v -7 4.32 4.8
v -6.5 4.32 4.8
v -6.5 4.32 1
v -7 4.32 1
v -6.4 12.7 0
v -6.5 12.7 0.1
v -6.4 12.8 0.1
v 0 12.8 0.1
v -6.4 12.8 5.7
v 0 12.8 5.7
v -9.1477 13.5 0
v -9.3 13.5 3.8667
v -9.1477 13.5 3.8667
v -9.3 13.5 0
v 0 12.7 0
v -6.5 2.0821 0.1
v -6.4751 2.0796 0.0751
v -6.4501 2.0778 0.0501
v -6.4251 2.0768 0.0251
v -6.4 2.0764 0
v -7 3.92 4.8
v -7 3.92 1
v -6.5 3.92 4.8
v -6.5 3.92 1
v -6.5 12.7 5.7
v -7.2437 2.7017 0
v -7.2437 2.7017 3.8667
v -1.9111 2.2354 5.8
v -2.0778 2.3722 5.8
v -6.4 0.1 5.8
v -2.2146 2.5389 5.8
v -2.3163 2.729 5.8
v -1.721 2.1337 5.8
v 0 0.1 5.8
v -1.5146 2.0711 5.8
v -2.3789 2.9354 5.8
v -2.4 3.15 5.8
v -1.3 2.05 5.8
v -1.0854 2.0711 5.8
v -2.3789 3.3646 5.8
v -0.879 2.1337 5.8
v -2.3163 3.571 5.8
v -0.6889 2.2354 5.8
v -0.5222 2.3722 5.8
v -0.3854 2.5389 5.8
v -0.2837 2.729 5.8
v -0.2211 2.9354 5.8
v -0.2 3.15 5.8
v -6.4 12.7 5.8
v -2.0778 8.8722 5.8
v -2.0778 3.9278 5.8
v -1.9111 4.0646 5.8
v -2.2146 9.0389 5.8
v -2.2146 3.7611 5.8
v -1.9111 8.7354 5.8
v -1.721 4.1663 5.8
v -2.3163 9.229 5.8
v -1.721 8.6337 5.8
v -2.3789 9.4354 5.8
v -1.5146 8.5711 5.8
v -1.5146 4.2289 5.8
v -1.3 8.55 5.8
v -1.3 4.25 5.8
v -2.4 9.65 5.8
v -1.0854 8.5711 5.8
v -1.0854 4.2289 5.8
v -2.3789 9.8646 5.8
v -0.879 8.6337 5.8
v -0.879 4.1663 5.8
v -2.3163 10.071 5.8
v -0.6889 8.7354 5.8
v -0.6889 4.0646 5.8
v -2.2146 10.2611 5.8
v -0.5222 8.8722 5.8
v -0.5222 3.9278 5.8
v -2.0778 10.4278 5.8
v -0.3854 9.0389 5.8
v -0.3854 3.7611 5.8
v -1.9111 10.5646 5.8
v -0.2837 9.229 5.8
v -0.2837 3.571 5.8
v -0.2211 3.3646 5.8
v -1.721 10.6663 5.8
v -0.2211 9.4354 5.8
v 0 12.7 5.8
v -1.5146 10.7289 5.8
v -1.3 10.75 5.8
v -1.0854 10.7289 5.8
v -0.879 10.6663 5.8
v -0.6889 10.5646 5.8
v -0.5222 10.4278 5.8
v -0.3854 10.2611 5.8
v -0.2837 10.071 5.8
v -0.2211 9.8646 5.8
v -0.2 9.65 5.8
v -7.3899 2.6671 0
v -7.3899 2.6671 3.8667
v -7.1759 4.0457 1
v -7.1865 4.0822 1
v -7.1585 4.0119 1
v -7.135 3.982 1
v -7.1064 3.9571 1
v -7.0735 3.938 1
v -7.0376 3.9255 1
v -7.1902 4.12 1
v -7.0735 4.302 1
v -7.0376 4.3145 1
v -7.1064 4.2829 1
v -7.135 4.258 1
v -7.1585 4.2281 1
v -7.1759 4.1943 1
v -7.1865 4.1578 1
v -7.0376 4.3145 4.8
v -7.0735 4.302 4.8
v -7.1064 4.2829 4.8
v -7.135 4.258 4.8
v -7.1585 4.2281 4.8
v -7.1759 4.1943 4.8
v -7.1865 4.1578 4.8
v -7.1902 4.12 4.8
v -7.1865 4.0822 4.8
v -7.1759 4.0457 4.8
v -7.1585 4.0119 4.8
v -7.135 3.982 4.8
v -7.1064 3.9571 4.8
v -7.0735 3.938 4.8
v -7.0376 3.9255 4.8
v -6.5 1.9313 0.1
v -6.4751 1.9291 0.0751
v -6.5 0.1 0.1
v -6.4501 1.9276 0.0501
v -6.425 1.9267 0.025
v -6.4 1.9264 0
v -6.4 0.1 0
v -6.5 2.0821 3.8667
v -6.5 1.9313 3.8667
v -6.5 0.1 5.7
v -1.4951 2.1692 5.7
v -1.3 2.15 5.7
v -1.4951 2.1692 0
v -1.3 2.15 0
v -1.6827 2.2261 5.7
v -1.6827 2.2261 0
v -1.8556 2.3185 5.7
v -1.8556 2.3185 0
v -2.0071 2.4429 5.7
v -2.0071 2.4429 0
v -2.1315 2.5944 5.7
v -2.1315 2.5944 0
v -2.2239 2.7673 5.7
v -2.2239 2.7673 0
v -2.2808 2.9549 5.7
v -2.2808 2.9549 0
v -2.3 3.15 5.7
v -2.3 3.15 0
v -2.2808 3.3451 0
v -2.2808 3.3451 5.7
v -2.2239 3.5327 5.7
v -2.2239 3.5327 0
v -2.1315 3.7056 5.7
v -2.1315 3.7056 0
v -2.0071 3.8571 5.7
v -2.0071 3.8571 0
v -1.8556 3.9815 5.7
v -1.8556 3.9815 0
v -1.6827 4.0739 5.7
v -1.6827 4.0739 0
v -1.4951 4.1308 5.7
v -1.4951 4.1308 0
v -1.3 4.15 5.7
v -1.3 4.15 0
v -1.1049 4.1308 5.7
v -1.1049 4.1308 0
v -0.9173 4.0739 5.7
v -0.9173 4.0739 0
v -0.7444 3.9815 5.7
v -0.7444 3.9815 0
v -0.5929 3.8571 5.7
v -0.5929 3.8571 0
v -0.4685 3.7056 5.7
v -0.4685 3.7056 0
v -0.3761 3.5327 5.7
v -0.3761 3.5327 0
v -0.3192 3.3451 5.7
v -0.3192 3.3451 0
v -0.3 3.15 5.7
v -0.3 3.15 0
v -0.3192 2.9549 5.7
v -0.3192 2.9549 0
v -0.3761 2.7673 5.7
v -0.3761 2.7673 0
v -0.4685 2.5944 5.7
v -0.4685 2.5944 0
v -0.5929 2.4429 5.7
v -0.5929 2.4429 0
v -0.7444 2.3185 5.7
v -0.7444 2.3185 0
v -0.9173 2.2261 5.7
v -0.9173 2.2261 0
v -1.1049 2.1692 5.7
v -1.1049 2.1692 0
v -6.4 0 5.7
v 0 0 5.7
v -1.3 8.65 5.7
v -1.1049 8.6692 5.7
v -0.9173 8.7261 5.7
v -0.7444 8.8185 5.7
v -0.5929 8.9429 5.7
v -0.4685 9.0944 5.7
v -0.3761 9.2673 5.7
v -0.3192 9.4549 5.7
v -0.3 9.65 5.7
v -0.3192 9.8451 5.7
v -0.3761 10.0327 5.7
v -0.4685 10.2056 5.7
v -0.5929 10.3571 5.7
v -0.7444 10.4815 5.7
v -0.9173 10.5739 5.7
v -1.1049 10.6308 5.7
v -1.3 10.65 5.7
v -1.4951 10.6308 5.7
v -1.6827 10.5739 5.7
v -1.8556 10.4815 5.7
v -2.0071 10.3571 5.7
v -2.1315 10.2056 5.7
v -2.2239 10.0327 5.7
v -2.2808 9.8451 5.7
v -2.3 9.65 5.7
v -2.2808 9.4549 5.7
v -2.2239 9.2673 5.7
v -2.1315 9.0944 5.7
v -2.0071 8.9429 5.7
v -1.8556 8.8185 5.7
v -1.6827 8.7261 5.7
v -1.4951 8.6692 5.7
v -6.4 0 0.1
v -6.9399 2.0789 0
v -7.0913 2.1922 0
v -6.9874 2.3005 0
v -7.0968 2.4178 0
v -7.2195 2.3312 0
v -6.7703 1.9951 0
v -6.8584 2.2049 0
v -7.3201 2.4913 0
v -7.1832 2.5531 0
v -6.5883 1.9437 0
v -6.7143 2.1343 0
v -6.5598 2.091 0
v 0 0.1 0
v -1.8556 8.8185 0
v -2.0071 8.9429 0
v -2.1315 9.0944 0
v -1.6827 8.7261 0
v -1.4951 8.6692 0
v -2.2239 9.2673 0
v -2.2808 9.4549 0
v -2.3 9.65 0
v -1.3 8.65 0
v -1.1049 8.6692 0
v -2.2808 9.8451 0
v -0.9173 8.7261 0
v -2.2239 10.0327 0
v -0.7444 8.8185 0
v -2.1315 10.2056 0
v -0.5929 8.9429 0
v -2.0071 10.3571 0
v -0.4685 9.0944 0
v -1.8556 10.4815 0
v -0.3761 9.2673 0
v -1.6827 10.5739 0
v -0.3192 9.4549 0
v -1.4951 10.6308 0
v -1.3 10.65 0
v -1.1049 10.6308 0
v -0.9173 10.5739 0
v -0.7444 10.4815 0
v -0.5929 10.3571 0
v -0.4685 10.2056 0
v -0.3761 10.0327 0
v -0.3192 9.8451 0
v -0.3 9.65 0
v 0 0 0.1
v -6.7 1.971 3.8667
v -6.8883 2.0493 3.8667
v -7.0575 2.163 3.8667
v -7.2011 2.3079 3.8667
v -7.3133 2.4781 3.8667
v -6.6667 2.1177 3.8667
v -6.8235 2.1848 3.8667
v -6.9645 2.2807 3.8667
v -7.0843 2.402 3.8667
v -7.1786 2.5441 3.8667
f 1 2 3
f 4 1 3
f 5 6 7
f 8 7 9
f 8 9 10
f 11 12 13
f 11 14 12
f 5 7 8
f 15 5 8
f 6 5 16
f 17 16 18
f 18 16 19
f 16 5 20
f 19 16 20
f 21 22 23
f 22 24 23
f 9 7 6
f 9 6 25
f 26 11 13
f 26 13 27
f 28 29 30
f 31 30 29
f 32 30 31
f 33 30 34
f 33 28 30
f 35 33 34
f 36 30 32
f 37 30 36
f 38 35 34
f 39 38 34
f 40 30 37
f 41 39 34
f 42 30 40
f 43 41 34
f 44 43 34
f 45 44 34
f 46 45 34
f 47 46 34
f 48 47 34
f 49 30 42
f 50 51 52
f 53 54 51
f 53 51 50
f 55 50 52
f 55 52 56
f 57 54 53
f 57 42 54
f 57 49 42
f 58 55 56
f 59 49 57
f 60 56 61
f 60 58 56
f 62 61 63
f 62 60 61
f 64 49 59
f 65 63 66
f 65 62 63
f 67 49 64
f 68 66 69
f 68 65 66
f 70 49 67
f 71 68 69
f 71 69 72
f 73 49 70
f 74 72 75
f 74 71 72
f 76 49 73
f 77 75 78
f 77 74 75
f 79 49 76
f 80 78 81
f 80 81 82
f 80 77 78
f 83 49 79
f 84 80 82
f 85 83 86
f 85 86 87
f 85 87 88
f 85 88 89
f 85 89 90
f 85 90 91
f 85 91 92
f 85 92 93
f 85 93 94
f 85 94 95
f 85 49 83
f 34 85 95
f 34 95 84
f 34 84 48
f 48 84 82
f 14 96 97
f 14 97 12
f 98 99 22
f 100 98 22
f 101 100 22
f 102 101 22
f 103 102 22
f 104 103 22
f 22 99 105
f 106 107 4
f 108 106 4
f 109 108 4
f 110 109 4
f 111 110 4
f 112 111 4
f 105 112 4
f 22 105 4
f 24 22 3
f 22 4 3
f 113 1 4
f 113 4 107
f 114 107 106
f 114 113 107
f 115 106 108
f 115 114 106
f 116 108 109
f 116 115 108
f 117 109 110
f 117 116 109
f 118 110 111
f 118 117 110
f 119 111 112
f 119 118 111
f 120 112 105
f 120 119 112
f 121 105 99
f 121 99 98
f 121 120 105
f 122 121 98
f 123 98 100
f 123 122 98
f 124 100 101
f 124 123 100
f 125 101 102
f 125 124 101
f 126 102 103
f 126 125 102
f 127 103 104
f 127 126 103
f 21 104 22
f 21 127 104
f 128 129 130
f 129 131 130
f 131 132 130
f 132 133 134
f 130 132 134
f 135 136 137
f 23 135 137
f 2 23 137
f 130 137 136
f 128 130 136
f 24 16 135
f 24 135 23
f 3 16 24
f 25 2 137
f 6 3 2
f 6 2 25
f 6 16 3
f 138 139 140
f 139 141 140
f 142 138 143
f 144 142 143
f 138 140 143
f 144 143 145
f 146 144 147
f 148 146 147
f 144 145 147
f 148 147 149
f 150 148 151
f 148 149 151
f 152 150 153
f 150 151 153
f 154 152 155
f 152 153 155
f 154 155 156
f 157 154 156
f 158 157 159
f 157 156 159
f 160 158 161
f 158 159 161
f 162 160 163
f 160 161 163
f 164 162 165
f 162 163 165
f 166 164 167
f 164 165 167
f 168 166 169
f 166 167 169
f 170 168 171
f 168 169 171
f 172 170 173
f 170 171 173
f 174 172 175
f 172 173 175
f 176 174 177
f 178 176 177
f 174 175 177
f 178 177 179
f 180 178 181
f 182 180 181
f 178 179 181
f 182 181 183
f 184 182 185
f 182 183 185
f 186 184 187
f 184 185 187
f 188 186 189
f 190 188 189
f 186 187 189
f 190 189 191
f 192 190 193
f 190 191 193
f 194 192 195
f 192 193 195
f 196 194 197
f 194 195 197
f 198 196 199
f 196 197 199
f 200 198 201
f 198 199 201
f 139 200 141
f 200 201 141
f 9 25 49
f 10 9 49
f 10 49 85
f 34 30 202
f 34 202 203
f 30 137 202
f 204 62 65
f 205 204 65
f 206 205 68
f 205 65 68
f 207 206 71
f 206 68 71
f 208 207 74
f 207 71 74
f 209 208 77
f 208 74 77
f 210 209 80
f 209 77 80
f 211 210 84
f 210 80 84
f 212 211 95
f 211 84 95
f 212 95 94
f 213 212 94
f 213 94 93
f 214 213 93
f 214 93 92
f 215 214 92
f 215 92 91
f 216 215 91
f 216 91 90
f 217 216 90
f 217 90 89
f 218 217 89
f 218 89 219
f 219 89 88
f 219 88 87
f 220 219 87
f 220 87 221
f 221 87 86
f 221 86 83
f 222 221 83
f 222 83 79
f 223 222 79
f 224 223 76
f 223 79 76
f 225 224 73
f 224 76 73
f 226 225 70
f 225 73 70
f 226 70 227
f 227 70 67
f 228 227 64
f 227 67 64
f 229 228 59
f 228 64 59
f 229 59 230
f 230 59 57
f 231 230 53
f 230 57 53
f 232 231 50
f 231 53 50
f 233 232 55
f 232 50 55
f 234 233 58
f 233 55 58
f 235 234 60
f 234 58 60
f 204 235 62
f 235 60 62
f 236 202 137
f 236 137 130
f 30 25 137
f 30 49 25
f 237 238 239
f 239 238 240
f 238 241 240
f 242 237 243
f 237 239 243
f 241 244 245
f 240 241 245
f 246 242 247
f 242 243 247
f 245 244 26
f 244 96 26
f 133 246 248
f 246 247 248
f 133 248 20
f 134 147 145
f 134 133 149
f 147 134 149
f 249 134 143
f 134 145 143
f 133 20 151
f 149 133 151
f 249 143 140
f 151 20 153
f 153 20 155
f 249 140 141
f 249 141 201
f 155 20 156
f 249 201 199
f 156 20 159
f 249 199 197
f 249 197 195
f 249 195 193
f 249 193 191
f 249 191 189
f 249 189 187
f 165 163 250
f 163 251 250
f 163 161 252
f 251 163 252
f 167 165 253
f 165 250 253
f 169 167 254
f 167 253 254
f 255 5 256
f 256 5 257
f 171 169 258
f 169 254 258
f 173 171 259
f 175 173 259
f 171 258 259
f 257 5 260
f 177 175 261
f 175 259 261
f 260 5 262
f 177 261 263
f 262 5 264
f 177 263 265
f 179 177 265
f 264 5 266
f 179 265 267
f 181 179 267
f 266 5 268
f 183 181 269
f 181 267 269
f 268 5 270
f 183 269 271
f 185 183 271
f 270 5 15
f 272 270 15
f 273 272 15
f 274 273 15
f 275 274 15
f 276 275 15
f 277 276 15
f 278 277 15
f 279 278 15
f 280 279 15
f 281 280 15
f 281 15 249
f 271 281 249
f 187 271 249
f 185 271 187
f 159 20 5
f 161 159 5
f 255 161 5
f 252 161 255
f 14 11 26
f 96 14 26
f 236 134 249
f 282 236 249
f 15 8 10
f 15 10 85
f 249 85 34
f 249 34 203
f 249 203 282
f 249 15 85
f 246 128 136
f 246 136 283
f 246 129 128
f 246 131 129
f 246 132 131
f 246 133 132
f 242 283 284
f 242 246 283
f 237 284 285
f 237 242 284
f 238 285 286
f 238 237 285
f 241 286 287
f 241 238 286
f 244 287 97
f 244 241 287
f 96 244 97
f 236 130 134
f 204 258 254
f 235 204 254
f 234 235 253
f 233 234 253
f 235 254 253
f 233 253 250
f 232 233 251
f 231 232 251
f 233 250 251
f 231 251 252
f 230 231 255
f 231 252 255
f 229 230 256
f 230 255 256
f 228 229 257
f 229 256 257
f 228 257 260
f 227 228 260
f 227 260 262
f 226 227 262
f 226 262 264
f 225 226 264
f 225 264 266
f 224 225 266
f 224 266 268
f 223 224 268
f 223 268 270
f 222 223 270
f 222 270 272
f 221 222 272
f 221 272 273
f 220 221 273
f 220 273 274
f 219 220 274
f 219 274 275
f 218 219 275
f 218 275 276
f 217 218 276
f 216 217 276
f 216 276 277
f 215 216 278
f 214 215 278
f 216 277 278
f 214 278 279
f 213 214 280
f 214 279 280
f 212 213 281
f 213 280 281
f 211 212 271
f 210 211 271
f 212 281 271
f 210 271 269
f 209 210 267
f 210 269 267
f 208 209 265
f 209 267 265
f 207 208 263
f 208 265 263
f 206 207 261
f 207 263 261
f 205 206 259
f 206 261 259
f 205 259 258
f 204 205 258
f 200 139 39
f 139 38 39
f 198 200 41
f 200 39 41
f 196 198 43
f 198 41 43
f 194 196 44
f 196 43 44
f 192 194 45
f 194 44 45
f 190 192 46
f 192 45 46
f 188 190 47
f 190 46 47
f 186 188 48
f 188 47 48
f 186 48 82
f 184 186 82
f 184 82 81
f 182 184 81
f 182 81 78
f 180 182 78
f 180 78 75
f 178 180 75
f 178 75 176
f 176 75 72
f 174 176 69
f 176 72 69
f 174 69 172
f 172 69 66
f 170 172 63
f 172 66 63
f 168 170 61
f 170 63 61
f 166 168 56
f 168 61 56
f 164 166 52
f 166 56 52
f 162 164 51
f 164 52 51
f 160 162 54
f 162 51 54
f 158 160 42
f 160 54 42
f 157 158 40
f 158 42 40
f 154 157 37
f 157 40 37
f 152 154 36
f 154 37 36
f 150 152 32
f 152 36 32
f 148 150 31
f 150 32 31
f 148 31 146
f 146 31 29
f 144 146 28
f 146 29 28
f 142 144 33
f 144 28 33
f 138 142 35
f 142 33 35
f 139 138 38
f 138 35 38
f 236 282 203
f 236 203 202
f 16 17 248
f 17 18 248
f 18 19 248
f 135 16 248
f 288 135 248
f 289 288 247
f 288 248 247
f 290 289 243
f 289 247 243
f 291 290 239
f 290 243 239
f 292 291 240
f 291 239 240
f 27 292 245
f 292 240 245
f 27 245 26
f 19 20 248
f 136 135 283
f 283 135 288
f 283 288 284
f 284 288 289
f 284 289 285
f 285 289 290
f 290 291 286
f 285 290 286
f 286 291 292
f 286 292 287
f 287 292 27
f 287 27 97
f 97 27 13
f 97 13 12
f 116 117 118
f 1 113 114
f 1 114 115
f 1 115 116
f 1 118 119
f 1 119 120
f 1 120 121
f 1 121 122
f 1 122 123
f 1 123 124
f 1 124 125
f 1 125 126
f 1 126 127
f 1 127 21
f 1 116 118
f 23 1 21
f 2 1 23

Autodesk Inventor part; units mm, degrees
ref_plane "YZ Plane" through (0, 0, 0) normal (1, 0, 0) x (0, 1, 0)
ref_plane "XZ Plane" through (0, 0, 0) normal (0, 1, 0) x (-1, 0, 0)
ref_plane "XY Plane" through (0, 0, 0) normal (0, 0, 1) x (1, 0, 0)
sketch "Sketch2" plane through (0, 0, 0) normal (0, 0, 1) x (1, 0, 0)
  line L0 (0, 0) -> (-6.5, 0)
  line L1 (-6.5, 0) -> (-6.5, 12.8)
  line L2 (-6.5, 12.8) -> (0, 12.8)
  line L3 (0, 12.8) -> (0, 0)
  dimension "d0" = 6.5
  dimension "d1" = 12.8
extrude "Extrusion1" add sketch "Sketch2" along normal blind 5.8
sketch "Sketch3" plane through (0, 0, 5.8) normal (0, 0, 1) x (1, 0, 0)
  line L0 (0, 6.4) -> (-6.5, 6.4)
  line L1 (0, 0) -> (0, 12.8) projected
  circle A0 centre (-1.3, 3.15) radius 1
  circle A1 centre (-1.3, 9.65) radius 1
  dimension "d4" = 6.5
  dimension "d5" = 6.5
  dimension "d6" = 1.3
  dimension "d7" = 2
  dimension "d8" = 12.8
  dimension "d9" = 0
hole "Hole1" at (-1.3, 3.15, 5.8) at (-1.3, 9.65, 5.8) direction (0, 0, -1) diameter 2 end through all
sketch "Sketch4" plane through (-6.5, 0, 0) normal (-1, 0, 0) x (0, 0, 1)
  line L0 (0, 6.4) -> (6.5, 6.4)
  line L1 (0, 0) -> (5.8, 0) projected
  line L2 (2.9, 6.4) -> (2.9, 4.12) construction
  line L3 (2.9, 4.12) -> (0.2636, 4.12) construction
  line L4 (0.2636, 4.12) -> (5.5364, 4.12)
  line L5 (4.8, 4.32) -> (1, 4.32)
  line L6 (1, 4.32) -> (1, 3.92)
  line L7 (1, 3.92) -> (4.8, 3.92)
  line L8 (4.8, 3.92) -> (4.8, 4.32)
  line L9 (4.8, 4.32) -> (1, 3.92) construction
  line L10 (1, 4.32) -> (4.8, 3.92) construction
  dimension "d17" = 6.5
  dimension "d18" = 6.4
  dimension "d19" = 2.28
  dimension "d20" = 2.6364
  dimension "d21" = 5.2727
  dimension "d22" = 3.8
  dimension "d23" = 0.4
extrude "Extrusion2" add sketch "Sketch4" along normal blind 0.5
sketch "Sketch5" plane through (-6.5, 3.92, 4.8) normal (0, 0, 1) x (1, 0, 0)
  line L0 (-0.5, 0) -> (-0.5, 0.4) projected
  line L1 (0, 0) -> (-0.5, 0) projected
  arc A0 (-0.5, 0.4) -> (-0.5, 0) centre (-0.4899, 0.2) ccw
  point P0 (6.5, -3.92)
extrude "Extrusion3" add sketch "Sketch5" against normal up to surface (3.8 mm away)
chamfer "Chamfer1" distance 0.1 angle 45 10 edges at (-6.5, 0, 2.9) (-6.5, 6.4, 5.8) (-6.5, 6.4, 0) (-6.5, 12.8, 2.9) (-3.25, 12.8, 5.8) (-3.25, 0, 5.8) (-3.25, 0, 0) (-3.25, 12.8, 0) (-1.3, 4.15, 5.8) (-1.3, 10.65, 5.8)
sketch "Sketch6" plane through (0, 0, 0) normal (0, 0, -1) x (-1, 0, 0)
  line L0 (7.3899, 2.6671) -> (9.3, 13.5)
  line L1 (7.3899, 2.6671) -> (18.3899, 2.6671) construction
  line L2 (6.4, 12.7) -> (6.4, 0.1) projected
  line L3 (6.4, 1.9264) -> (4.4, 1.9264)
  line L4 (6.4, 1.9264) -> (8.4, 1.9264) construction
  arc A0 (6.4, 1.9264) -> (7.3899, 2.6671) centre (6.4, 2.9582) ccw
  line L5 (9.1477, 13.5) -> (7.2437, 2.7017)
  arc A1 (6.4, 2.0764) -> (7.2437, 2.7017) centre (6.4, 2.9582) ccw
  line L6 (6.4, 2.0764) -> (4.4, 2.0764)
  line L7 (4.4, 2.0764) -> (4.4, 1.9264)
  line L8 (9.3, 13.5) -> (9.1477, 13.5)
  line L9 (0, 0) -> (6.4, 0) projected
  dimension "d31" = 11
  dimension "d32" = 80
  dimension "d33" = 2
  dimension "d34" = 180
  dimension "d35" = 0.15
  dimension "d36" = 9.3
  dimension "d37" = 13.5
  dimension "d38" = 1.0318
extrude "Extrusion4" add sketch "Sketch6" against normal blind 3.8667
equation "\"d4\" = d0"
equation "\"d8\" = d1"
equation "\"d17\" = d0"
equation "\"d18\" = 0.5 * d1"
equation "\"d20\" = 0.454545 * d2"
equation "\"d21\" = 0.909091 * d2"
equation "\"d39\" = 0.666667 * d2"
equation "\"d2\" = 5.8"
properties part number "small-tact-switch" material "ABS Plastic"
